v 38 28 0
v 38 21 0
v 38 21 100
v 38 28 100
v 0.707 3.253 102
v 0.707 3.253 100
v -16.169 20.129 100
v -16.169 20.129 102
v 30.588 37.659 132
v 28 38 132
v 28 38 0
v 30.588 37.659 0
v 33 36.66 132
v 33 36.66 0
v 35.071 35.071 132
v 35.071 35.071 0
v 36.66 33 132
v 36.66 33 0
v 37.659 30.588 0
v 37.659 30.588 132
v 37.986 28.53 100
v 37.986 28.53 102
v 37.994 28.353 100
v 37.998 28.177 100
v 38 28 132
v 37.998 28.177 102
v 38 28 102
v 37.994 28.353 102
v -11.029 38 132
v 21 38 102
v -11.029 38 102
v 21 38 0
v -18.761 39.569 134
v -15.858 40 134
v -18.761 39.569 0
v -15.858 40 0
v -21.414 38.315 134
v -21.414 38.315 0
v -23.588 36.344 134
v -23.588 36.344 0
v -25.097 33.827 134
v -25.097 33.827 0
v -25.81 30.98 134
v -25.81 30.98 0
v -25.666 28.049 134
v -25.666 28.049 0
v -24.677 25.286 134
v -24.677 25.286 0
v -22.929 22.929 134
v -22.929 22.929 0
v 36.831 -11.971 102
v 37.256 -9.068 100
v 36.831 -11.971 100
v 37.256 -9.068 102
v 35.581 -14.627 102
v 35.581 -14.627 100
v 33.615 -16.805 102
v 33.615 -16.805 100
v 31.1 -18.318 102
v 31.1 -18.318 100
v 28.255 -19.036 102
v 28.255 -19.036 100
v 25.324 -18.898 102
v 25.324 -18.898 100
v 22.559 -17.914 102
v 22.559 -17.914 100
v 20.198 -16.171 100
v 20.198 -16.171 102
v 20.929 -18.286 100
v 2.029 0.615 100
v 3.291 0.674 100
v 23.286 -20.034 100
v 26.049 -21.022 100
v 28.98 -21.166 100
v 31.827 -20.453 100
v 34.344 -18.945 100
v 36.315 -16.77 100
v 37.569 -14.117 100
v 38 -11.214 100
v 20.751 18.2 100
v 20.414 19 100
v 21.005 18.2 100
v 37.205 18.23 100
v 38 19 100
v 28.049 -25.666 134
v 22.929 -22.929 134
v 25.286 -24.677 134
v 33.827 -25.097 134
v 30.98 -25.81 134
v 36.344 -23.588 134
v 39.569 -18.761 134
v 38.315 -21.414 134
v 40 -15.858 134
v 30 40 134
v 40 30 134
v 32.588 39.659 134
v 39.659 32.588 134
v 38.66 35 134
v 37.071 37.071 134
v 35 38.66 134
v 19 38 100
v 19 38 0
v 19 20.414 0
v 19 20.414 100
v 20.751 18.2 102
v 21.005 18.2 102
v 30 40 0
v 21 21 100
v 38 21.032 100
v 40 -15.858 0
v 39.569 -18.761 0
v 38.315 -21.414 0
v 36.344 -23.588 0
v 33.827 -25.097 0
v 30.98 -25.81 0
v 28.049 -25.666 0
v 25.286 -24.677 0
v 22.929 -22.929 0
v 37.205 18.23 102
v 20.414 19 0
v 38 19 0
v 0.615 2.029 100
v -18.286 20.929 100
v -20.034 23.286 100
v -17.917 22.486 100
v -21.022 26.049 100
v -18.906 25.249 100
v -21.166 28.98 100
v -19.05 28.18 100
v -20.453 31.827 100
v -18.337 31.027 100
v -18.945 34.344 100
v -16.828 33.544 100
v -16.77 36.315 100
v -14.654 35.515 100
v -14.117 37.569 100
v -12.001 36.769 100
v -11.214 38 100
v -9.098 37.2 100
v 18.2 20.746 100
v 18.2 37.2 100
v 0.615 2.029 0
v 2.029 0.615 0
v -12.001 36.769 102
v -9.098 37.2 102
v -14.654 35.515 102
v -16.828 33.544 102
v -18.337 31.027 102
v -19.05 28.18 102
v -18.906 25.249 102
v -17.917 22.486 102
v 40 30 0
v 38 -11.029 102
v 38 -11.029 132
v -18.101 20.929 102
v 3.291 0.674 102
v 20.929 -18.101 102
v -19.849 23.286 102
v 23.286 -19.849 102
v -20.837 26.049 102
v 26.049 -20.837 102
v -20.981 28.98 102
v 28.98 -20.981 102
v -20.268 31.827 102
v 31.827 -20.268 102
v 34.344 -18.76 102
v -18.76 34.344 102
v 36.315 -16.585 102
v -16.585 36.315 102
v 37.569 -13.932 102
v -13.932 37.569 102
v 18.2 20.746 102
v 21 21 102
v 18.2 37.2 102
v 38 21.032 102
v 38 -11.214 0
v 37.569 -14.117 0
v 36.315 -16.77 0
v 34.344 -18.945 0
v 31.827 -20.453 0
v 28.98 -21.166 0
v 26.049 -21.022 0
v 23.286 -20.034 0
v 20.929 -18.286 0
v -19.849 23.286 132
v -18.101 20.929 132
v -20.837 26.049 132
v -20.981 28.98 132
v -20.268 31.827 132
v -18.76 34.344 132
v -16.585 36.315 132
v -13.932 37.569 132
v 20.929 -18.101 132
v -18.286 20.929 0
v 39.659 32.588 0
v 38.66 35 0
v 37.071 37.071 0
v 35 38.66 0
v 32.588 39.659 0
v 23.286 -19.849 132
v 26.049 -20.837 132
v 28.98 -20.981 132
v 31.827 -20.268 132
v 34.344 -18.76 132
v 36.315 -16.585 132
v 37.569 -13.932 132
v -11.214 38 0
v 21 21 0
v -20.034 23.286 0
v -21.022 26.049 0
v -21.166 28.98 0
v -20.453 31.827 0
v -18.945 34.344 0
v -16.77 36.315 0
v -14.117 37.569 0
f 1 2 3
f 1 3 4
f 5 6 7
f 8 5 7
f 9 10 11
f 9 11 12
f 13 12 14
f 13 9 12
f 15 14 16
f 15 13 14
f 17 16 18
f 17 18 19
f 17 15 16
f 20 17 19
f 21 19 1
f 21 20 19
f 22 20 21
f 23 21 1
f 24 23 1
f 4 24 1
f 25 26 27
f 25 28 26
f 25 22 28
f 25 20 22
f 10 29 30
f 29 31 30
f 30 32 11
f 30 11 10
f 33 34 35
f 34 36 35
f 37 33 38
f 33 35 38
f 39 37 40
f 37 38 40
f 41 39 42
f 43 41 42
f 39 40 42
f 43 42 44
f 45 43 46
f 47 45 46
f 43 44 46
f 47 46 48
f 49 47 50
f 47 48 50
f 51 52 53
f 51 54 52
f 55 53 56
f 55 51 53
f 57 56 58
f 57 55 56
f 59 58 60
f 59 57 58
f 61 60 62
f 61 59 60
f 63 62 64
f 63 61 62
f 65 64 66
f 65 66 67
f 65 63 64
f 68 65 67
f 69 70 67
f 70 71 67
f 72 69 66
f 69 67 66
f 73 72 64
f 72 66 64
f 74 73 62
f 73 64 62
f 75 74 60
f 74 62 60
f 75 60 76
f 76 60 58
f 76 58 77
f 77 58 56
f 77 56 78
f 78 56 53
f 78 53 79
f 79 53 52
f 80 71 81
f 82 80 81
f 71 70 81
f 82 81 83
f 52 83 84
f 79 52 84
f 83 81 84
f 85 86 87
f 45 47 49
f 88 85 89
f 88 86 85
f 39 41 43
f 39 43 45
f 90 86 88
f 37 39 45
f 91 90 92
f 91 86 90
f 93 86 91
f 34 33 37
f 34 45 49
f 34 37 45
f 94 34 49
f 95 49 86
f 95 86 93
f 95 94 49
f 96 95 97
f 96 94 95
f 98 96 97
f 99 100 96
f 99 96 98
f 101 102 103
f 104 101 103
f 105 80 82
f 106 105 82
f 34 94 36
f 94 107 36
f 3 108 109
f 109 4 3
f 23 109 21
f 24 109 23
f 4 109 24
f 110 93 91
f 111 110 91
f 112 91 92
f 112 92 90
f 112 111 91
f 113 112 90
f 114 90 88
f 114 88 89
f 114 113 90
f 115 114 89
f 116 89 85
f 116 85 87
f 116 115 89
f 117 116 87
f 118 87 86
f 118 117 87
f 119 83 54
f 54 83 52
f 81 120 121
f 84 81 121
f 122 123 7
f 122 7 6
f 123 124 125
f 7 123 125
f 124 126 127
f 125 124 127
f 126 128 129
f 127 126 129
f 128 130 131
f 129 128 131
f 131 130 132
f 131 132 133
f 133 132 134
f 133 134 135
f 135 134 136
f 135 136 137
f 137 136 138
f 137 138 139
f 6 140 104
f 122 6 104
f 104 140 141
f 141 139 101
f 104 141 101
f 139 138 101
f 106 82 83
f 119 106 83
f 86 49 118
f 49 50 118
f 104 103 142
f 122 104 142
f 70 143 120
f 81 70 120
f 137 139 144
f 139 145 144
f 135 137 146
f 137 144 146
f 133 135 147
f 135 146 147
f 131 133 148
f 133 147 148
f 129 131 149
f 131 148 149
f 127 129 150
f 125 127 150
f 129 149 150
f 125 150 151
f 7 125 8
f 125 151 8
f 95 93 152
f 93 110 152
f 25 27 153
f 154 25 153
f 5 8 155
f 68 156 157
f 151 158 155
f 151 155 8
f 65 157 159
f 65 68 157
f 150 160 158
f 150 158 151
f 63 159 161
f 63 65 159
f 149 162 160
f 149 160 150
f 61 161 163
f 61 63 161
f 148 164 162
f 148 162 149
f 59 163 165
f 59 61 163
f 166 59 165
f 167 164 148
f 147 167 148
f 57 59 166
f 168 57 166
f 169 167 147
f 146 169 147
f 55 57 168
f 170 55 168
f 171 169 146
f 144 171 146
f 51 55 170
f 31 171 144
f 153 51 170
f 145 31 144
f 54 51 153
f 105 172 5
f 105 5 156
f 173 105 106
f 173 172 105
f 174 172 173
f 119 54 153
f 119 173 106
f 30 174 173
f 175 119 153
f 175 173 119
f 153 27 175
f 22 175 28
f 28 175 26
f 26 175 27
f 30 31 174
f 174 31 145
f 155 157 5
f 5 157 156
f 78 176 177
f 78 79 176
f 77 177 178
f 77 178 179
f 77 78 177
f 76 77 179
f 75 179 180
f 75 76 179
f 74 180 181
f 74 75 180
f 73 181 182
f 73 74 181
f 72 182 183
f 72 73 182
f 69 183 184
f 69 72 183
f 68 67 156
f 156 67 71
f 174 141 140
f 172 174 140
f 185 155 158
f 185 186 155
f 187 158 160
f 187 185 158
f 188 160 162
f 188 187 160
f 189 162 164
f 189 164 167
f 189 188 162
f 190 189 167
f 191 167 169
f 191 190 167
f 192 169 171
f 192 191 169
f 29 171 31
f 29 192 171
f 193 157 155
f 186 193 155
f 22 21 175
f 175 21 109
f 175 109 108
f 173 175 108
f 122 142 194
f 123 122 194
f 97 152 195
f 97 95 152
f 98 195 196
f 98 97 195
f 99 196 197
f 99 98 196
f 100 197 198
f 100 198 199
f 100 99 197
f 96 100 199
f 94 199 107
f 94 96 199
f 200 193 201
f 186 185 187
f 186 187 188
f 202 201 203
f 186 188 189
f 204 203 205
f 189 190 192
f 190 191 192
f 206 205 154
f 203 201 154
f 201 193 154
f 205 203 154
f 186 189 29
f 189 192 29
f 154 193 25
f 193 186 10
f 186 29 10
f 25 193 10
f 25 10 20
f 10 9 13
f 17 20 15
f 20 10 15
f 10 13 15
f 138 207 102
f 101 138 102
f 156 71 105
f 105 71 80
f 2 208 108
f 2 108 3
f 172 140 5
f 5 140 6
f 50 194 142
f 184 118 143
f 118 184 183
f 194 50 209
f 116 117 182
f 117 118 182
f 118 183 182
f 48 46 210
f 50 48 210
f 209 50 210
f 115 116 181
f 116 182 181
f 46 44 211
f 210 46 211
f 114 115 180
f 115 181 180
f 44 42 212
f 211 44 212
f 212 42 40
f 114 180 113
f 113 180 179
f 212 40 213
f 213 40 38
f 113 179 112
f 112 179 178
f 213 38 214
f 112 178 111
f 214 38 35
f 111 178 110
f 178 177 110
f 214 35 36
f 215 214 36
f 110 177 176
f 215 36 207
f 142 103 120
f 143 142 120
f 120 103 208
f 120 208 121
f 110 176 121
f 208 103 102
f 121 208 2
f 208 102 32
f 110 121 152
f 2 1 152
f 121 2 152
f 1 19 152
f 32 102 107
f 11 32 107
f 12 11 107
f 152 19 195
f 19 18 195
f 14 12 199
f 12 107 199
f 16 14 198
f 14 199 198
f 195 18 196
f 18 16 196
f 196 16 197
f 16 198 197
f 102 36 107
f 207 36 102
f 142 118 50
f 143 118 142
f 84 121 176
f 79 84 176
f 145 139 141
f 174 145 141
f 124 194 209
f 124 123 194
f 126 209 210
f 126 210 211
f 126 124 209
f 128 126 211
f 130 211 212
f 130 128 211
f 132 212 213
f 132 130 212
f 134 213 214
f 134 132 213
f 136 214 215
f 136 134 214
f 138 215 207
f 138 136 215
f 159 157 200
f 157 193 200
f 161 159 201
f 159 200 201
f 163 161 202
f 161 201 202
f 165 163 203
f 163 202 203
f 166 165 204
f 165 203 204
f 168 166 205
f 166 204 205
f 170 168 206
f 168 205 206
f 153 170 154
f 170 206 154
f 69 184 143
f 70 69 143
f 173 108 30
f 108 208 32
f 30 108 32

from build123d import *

# Parameters (mm, degrees)
F0_W      = 17
F0_H      = 17
F1_DEPTH  = 100
F4_DEPTH  = 2
F7_DEPTH  = 30
F10_DEPTH = 2
F11_R     = 10


with BuildPart() as f1:
    # F0 (on Top) → F1 (new body)
    with BuildSketch(Plane.XY):
        Polygon((40, -37.3566303961), (40, 40), (-40, 40), (-38, 38), (40, -40), align=None)
        Polygon((20.4142135624, 19), (38, 19), (38, -35.3566303961), (2.0287915831, 0.6145780208), align=None, mode=Mode.SUBTRACT)
        Polygon((19, 20.4142135624), (0.6145780208, 2.0287915831), (-35.3566303961, 38), (19, 38), align=None, mode=Mode.SUBTRACT)
        with Locations((29.5, 29.5)):
            Rectangle(F0_W, F0_H, mode=Mode.SUBTRACT)
    extrude(amount=F1_DEPTH)

    # F3 (on offset) → F4 (join)
    with BuildSketch(Plane.XY.offset(100)):
        Polygon((40, 40), (-40, 40), (0, 0), (40, -40), align=None)
        Polygon((21.0052309155, 18.2000048862), (37.2052026456, 18.2302694688), (37.3013024139, -33.2098427904), (3.2906330243, 0.673986953), (20.7508157718, 18.199529591), align=None, mode=Mode.SUBTRACT)
        Polygon((0.7071067812, 3.2526911935), (-33.2402020254, 37.2), (18.2, 37.2), (18.2, 21), (18.2, 20.7455844123), align=None, mode=Mode.SUBTRACT)
        Polygon((37.999970334, 21.03175913), (21, 21), (21, 38), (37.9682704806, 38), align=None, mode=Mode.SUBTRACT)
    extrude(amount=F4_DEPTH)

    # F6 (on offset) → F7 (join)
    with BuildSketch(Plane.XY.offset(102)):
        Polygon((40, -40), (40, 40), (-40, 40), align=None)
        Polygon((-35.1715728753, 38), (38, 38), (38, -35.1715728753), align=None, mode=Mode.SUBTRACT)
    extrude(amount=F7_DEPTH)

    # F9 (on offset) → F10 (join)
    with BuildSketch(Plane.XY.offset(132)):
        Polygon((40, -40), (40, 40), (-40, 40), align=None)
    extrude(amount=F10_DEPTH)

    # F11
    f11_edges = [f1.edges().sort_by_distance(p)[0] for p in [
        (-35.35663, 38, 50),
        (-33.240202, 37.2, 101),
        (-35.171573, 38, 117),
        (-40, 40, 67),
        (38, -35.35663, 50),
        (40, -40, 67),
        (37.301302, -33.209843, 101),
        (38, -35.171573, 117),
        (38, 38, 50),
        (40, 40, 67),
    ]]
    fillet(f11_edges, radius=F11_R)


solid = f1.part
